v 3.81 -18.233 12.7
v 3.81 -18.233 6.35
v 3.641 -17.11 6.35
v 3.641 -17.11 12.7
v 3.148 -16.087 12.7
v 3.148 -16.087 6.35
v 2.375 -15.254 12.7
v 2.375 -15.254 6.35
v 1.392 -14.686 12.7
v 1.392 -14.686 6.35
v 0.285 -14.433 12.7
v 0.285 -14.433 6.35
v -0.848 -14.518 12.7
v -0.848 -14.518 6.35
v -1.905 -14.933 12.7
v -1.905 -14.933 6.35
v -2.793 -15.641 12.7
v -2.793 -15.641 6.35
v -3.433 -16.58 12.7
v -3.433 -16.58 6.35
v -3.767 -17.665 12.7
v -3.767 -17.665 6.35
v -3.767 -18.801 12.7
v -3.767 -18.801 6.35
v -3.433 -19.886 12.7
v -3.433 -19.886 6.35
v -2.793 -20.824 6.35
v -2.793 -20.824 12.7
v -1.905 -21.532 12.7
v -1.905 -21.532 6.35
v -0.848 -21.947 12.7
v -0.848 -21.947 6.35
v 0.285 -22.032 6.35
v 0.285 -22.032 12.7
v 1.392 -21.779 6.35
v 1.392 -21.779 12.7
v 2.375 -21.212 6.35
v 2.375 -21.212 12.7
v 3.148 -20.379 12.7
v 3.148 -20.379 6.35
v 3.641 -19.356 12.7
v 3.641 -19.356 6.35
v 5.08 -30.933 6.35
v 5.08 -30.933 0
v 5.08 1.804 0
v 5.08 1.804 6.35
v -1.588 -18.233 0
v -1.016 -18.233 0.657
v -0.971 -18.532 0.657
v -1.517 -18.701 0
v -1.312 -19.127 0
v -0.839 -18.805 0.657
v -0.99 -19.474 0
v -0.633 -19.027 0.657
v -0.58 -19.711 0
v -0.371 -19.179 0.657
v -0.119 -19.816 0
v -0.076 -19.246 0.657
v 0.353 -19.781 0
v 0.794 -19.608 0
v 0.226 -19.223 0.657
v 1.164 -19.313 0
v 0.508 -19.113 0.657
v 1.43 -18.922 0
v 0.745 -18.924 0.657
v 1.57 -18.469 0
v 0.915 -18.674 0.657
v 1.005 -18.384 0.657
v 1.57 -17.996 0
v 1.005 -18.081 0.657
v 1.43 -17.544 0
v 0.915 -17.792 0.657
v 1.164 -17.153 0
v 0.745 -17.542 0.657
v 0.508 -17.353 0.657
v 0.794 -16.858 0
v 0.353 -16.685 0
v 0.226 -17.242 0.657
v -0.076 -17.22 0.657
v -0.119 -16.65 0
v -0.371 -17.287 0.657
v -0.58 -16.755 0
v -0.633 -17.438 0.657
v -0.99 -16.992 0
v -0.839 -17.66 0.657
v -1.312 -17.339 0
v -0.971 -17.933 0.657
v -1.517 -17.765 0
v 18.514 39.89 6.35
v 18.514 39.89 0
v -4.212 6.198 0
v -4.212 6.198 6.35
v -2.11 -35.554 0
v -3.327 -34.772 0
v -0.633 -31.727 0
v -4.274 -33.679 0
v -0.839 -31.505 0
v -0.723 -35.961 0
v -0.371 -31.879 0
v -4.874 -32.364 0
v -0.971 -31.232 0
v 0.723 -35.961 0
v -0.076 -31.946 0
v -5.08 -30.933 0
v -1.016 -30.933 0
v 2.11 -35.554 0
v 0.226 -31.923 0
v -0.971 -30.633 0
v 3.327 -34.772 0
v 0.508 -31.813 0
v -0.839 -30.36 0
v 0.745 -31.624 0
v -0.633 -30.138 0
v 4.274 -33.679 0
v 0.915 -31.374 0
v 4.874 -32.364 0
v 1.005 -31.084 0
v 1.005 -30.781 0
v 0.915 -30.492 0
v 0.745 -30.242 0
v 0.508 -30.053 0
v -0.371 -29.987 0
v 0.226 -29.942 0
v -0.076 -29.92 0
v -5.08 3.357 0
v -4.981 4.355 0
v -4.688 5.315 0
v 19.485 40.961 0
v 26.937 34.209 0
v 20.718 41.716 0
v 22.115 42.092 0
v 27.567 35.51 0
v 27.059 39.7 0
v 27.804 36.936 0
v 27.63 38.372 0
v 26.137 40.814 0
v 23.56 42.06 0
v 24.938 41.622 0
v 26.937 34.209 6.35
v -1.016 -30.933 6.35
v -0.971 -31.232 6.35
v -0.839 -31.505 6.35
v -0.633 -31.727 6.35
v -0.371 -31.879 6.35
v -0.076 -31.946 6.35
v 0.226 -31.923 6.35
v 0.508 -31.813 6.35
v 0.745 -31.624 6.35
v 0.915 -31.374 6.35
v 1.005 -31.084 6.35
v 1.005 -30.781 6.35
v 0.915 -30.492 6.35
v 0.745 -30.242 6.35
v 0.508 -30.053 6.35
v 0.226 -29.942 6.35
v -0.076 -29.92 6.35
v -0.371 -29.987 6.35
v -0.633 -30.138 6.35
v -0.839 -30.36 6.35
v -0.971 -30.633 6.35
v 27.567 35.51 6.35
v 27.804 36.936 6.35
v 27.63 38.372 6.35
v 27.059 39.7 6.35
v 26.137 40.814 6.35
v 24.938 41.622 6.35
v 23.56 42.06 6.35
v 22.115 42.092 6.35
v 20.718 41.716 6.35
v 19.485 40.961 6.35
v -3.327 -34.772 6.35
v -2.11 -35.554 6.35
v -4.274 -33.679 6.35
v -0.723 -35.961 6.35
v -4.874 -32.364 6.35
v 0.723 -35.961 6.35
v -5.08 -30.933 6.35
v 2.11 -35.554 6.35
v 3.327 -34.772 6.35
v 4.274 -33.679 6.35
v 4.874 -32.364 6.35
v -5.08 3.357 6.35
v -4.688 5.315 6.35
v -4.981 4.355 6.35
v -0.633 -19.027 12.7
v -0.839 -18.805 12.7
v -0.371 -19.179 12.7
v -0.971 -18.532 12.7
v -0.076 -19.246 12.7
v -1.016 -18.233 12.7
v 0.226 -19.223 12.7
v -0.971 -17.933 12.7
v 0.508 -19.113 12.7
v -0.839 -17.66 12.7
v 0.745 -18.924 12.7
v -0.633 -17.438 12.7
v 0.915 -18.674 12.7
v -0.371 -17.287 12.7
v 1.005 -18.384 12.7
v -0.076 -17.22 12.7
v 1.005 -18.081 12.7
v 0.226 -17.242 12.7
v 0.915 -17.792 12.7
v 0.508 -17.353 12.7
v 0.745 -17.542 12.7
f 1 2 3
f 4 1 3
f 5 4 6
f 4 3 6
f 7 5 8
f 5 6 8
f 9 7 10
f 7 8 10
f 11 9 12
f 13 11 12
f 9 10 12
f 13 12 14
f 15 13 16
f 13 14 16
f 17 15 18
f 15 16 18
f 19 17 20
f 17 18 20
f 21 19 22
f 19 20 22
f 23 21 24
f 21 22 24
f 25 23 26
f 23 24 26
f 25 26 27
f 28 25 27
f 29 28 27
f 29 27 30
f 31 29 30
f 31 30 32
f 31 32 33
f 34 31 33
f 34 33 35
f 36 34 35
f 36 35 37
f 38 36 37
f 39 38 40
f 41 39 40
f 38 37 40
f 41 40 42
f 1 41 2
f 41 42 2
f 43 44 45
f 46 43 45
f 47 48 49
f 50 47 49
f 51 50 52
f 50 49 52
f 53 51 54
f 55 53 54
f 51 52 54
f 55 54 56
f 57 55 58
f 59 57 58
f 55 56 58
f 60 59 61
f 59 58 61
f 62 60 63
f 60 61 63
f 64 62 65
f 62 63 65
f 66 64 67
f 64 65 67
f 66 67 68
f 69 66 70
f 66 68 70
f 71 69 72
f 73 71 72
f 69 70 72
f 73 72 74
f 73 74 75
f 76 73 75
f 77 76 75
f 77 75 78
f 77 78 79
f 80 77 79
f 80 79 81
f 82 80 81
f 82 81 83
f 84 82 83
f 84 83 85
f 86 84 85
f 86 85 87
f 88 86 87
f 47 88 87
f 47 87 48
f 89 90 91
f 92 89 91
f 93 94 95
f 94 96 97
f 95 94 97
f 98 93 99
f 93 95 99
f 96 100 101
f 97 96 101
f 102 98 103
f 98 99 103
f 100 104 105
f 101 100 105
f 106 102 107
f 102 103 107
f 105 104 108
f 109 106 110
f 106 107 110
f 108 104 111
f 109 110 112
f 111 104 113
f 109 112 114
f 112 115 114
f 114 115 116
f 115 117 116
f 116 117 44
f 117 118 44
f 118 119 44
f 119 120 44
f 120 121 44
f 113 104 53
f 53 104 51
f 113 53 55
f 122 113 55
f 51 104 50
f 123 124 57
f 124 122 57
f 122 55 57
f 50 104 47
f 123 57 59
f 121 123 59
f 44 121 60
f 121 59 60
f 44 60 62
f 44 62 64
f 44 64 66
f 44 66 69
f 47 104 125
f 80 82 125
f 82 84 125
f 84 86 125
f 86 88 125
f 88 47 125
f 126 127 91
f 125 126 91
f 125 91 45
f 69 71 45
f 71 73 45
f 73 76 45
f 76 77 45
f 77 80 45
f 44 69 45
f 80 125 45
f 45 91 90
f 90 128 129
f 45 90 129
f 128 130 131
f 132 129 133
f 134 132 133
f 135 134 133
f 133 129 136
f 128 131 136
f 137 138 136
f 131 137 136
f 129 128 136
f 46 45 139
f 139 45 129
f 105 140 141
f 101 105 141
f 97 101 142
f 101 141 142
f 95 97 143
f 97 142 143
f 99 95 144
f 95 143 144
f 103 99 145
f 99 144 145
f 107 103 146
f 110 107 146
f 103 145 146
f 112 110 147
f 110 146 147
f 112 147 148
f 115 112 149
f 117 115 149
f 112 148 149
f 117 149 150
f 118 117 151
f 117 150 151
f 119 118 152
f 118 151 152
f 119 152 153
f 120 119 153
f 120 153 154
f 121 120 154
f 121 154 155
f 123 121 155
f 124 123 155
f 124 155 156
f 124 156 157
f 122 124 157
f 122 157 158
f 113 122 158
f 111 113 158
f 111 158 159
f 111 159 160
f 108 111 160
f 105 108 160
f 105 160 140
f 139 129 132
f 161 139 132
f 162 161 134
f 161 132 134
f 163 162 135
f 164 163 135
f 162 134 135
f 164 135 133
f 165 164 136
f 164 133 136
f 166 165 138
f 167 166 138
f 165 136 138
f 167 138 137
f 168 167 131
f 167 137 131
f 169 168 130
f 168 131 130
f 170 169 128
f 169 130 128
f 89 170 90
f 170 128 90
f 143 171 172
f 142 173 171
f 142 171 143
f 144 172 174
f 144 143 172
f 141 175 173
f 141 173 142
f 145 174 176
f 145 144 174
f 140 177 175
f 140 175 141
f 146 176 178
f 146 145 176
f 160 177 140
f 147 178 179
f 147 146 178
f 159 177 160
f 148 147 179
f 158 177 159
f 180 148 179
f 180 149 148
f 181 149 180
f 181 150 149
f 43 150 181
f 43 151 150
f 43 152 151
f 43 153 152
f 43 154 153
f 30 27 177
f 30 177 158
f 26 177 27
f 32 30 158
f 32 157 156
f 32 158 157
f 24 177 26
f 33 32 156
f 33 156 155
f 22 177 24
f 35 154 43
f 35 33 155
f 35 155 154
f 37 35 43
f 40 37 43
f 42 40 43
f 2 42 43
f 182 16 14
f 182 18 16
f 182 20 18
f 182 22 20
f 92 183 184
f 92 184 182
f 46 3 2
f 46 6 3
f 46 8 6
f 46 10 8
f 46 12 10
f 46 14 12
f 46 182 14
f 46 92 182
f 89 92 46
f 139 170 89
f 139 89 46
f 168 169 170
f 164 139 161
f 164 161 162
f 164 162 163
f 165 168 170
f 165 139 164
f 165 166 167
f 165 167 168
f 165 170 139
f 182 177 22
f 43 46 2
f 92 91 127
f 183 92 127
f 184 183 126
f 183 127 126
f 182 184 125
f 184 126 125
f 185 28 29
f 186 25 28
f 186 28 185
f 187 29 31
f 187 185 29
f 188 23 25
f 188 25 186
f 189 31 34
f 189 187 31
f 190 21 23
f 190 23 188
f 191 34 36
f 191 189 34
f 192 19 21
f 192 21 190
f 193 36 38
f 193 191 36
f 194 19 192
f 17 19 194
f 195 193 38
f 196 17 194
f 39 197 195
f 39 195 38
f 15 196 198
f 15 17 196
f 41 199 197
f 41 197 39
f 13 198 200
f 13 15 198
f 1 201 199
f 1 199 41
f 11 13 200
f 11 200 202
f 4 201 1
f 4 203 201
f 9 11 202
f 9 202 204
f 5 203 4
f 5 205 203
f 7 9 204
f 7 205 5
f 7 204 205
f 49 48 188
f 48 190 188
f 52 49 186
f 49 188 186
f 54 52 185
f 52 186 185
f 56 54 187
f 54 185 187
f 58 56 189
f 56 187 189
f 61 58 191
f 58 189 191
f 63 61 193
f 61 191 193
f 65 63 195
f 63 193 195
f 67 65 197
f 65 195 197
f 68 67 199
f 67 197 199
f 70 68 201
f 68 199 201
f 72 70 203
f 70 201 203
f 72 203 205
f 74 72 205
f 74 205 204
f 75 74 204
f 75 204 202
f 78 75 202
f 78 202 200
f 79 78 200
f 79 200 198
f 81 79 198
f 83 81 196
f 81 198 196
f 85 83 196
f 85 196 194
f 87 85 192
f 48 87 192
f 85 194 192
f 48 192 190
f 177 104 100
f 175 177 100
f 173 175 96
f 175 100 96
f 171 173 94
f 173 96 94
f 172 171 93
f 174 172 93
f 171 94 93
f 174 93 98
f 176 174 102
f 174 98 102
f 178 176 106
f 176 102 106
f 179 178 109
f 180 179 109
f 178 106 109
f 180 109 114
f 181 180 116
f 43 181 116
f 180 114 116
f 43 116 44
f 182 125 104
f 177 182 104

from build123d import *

# Parameters (mm, degrees)
F1_DEPTH       = 6.35
F2_R           = 3.81
F3_DEPTH       = 6.35
F4_D           = 2.032
F4_CSINK_D     = 3.175
F4_CSINK_ANGLE = 82
F5_D           = 2.032


with BuildPart() as f1:
    # F0 (on Top) → F1 (new body)
    with BuildSketch(Plane.XY):
        with BuildLine():
            ThreePointArc((-4.2115108686, 6.1978799769), (-0.9693096965, 8.3438461191), (2.8406999496, 7.5686908958))
            ThreePointArc((2.8406999496, 7.5686908958), (4.4853737717, 5.7420955662), (5.08, 3.3571800272))
            Line((5.08, 3.3571800272), (5.08, 1.8040681654))
            Line((5.08, 1.8040681654), (26.9371104656, 34.2085670262))
            ThreePointArc((26.9371104656, 34.2085670262), (25.5662995467, 41.2607778444), (18.5140887285, 39.8899669255))
            Line((18.5140887285, 39.8899669255), (-4.2115108686, 6.1978799769))
        make_face()
        with BuildLine():
            Line((0, 3.3571800272), (0, -1.7228199728))
            ThreePointArc((0, -1.7228199728), (2.384915539, -1.1281937445), (4.2115108686, 0.5164800776))
            Line((4.2115108686, 0.5164800776), (5.08, 1.8040681654))
            Line((5.08, 1.8040681654), (5.08, 3.3571800272))
            ThreePointArc((5.08, 3.3571800272), (4.4853737717, 5.7420955662), (2.8406999496, 7.5686908958))
            Line((2.8406999496, 7.5686908958), (0, 3.3571800272))
        make_face()
        with BuildLine():
            ThreePointArc((4.2115108686, 0.5164800776), (2.384915539, -1.1281937445), (0, -1.7228199728))
            ThreePointArc((0, -1.7228199728), (-3.5921024484, -0.2349224212), (-5.08, 3.3571800272))
            Line((-5.08, 3.3571800272), (-5.08, -30.9328199728))
            ThreePointArc((-5.08, -30.9328199728), (0, -36.0128199728), (5.08, -30.9328199728))
            Line((5.08, -30.9328199728), (5.08, 1.8040681654))
            Line((5.08, 1.8040681654), (4.2115108686, 0.5164800776))
        make_face()
        with BuildLine():
            ThreePointArc((-5.08, 3.3571800272), (-3.5921024484, -0.2349224212), (0, -1.7228199728))
            Line((0, -1.7228199728), (0, 3.3571800272))
            Line((0, 3.3571800272), (2.8406999496, 7.5686908958))
            ThreePointArc((2.8406999496, 7.5686908958), (-0.9693096965, 8.3438461191), (-4.2115108686, 6.1978799769))
            ThreePointArc((-4.2115108686, 6.1978799769), (-4.8580281603, 4.8424282872), (-5.08, 3.3571800272))
        make_face()
    extrude(amount=F1_DEPTH)

    # F2 (on face) → F3 (join)
    with BuildSketch(Plane.XY.offset(6.35)):
        with Locations((0, -18.2328199728)):
            Circle(F2_R)
    extrude(amount=F3_DEPTH)

    # F4 (through all)
    with Locations(Plane(origin=(0, 0, 0), x_dir=(1, 0, 0), z_dir=(0, 0, -1))):
        with Locations((0, 18.2328199728)):
            CounterSinkHole(F4_D / 2, F4_CSINK_D / 2, counter_sink_angle=F4_CSINK_ANGLE)

    # F5 (through all)
    with Locations(Plane(origin=(0, 0, 0), x_dir=(1, 0, 0), z_dir=(0, 0, -1))):
        with Locations((0, 30.9328199728)):
            Hole(F5_D / 2)


solid = f1.part
